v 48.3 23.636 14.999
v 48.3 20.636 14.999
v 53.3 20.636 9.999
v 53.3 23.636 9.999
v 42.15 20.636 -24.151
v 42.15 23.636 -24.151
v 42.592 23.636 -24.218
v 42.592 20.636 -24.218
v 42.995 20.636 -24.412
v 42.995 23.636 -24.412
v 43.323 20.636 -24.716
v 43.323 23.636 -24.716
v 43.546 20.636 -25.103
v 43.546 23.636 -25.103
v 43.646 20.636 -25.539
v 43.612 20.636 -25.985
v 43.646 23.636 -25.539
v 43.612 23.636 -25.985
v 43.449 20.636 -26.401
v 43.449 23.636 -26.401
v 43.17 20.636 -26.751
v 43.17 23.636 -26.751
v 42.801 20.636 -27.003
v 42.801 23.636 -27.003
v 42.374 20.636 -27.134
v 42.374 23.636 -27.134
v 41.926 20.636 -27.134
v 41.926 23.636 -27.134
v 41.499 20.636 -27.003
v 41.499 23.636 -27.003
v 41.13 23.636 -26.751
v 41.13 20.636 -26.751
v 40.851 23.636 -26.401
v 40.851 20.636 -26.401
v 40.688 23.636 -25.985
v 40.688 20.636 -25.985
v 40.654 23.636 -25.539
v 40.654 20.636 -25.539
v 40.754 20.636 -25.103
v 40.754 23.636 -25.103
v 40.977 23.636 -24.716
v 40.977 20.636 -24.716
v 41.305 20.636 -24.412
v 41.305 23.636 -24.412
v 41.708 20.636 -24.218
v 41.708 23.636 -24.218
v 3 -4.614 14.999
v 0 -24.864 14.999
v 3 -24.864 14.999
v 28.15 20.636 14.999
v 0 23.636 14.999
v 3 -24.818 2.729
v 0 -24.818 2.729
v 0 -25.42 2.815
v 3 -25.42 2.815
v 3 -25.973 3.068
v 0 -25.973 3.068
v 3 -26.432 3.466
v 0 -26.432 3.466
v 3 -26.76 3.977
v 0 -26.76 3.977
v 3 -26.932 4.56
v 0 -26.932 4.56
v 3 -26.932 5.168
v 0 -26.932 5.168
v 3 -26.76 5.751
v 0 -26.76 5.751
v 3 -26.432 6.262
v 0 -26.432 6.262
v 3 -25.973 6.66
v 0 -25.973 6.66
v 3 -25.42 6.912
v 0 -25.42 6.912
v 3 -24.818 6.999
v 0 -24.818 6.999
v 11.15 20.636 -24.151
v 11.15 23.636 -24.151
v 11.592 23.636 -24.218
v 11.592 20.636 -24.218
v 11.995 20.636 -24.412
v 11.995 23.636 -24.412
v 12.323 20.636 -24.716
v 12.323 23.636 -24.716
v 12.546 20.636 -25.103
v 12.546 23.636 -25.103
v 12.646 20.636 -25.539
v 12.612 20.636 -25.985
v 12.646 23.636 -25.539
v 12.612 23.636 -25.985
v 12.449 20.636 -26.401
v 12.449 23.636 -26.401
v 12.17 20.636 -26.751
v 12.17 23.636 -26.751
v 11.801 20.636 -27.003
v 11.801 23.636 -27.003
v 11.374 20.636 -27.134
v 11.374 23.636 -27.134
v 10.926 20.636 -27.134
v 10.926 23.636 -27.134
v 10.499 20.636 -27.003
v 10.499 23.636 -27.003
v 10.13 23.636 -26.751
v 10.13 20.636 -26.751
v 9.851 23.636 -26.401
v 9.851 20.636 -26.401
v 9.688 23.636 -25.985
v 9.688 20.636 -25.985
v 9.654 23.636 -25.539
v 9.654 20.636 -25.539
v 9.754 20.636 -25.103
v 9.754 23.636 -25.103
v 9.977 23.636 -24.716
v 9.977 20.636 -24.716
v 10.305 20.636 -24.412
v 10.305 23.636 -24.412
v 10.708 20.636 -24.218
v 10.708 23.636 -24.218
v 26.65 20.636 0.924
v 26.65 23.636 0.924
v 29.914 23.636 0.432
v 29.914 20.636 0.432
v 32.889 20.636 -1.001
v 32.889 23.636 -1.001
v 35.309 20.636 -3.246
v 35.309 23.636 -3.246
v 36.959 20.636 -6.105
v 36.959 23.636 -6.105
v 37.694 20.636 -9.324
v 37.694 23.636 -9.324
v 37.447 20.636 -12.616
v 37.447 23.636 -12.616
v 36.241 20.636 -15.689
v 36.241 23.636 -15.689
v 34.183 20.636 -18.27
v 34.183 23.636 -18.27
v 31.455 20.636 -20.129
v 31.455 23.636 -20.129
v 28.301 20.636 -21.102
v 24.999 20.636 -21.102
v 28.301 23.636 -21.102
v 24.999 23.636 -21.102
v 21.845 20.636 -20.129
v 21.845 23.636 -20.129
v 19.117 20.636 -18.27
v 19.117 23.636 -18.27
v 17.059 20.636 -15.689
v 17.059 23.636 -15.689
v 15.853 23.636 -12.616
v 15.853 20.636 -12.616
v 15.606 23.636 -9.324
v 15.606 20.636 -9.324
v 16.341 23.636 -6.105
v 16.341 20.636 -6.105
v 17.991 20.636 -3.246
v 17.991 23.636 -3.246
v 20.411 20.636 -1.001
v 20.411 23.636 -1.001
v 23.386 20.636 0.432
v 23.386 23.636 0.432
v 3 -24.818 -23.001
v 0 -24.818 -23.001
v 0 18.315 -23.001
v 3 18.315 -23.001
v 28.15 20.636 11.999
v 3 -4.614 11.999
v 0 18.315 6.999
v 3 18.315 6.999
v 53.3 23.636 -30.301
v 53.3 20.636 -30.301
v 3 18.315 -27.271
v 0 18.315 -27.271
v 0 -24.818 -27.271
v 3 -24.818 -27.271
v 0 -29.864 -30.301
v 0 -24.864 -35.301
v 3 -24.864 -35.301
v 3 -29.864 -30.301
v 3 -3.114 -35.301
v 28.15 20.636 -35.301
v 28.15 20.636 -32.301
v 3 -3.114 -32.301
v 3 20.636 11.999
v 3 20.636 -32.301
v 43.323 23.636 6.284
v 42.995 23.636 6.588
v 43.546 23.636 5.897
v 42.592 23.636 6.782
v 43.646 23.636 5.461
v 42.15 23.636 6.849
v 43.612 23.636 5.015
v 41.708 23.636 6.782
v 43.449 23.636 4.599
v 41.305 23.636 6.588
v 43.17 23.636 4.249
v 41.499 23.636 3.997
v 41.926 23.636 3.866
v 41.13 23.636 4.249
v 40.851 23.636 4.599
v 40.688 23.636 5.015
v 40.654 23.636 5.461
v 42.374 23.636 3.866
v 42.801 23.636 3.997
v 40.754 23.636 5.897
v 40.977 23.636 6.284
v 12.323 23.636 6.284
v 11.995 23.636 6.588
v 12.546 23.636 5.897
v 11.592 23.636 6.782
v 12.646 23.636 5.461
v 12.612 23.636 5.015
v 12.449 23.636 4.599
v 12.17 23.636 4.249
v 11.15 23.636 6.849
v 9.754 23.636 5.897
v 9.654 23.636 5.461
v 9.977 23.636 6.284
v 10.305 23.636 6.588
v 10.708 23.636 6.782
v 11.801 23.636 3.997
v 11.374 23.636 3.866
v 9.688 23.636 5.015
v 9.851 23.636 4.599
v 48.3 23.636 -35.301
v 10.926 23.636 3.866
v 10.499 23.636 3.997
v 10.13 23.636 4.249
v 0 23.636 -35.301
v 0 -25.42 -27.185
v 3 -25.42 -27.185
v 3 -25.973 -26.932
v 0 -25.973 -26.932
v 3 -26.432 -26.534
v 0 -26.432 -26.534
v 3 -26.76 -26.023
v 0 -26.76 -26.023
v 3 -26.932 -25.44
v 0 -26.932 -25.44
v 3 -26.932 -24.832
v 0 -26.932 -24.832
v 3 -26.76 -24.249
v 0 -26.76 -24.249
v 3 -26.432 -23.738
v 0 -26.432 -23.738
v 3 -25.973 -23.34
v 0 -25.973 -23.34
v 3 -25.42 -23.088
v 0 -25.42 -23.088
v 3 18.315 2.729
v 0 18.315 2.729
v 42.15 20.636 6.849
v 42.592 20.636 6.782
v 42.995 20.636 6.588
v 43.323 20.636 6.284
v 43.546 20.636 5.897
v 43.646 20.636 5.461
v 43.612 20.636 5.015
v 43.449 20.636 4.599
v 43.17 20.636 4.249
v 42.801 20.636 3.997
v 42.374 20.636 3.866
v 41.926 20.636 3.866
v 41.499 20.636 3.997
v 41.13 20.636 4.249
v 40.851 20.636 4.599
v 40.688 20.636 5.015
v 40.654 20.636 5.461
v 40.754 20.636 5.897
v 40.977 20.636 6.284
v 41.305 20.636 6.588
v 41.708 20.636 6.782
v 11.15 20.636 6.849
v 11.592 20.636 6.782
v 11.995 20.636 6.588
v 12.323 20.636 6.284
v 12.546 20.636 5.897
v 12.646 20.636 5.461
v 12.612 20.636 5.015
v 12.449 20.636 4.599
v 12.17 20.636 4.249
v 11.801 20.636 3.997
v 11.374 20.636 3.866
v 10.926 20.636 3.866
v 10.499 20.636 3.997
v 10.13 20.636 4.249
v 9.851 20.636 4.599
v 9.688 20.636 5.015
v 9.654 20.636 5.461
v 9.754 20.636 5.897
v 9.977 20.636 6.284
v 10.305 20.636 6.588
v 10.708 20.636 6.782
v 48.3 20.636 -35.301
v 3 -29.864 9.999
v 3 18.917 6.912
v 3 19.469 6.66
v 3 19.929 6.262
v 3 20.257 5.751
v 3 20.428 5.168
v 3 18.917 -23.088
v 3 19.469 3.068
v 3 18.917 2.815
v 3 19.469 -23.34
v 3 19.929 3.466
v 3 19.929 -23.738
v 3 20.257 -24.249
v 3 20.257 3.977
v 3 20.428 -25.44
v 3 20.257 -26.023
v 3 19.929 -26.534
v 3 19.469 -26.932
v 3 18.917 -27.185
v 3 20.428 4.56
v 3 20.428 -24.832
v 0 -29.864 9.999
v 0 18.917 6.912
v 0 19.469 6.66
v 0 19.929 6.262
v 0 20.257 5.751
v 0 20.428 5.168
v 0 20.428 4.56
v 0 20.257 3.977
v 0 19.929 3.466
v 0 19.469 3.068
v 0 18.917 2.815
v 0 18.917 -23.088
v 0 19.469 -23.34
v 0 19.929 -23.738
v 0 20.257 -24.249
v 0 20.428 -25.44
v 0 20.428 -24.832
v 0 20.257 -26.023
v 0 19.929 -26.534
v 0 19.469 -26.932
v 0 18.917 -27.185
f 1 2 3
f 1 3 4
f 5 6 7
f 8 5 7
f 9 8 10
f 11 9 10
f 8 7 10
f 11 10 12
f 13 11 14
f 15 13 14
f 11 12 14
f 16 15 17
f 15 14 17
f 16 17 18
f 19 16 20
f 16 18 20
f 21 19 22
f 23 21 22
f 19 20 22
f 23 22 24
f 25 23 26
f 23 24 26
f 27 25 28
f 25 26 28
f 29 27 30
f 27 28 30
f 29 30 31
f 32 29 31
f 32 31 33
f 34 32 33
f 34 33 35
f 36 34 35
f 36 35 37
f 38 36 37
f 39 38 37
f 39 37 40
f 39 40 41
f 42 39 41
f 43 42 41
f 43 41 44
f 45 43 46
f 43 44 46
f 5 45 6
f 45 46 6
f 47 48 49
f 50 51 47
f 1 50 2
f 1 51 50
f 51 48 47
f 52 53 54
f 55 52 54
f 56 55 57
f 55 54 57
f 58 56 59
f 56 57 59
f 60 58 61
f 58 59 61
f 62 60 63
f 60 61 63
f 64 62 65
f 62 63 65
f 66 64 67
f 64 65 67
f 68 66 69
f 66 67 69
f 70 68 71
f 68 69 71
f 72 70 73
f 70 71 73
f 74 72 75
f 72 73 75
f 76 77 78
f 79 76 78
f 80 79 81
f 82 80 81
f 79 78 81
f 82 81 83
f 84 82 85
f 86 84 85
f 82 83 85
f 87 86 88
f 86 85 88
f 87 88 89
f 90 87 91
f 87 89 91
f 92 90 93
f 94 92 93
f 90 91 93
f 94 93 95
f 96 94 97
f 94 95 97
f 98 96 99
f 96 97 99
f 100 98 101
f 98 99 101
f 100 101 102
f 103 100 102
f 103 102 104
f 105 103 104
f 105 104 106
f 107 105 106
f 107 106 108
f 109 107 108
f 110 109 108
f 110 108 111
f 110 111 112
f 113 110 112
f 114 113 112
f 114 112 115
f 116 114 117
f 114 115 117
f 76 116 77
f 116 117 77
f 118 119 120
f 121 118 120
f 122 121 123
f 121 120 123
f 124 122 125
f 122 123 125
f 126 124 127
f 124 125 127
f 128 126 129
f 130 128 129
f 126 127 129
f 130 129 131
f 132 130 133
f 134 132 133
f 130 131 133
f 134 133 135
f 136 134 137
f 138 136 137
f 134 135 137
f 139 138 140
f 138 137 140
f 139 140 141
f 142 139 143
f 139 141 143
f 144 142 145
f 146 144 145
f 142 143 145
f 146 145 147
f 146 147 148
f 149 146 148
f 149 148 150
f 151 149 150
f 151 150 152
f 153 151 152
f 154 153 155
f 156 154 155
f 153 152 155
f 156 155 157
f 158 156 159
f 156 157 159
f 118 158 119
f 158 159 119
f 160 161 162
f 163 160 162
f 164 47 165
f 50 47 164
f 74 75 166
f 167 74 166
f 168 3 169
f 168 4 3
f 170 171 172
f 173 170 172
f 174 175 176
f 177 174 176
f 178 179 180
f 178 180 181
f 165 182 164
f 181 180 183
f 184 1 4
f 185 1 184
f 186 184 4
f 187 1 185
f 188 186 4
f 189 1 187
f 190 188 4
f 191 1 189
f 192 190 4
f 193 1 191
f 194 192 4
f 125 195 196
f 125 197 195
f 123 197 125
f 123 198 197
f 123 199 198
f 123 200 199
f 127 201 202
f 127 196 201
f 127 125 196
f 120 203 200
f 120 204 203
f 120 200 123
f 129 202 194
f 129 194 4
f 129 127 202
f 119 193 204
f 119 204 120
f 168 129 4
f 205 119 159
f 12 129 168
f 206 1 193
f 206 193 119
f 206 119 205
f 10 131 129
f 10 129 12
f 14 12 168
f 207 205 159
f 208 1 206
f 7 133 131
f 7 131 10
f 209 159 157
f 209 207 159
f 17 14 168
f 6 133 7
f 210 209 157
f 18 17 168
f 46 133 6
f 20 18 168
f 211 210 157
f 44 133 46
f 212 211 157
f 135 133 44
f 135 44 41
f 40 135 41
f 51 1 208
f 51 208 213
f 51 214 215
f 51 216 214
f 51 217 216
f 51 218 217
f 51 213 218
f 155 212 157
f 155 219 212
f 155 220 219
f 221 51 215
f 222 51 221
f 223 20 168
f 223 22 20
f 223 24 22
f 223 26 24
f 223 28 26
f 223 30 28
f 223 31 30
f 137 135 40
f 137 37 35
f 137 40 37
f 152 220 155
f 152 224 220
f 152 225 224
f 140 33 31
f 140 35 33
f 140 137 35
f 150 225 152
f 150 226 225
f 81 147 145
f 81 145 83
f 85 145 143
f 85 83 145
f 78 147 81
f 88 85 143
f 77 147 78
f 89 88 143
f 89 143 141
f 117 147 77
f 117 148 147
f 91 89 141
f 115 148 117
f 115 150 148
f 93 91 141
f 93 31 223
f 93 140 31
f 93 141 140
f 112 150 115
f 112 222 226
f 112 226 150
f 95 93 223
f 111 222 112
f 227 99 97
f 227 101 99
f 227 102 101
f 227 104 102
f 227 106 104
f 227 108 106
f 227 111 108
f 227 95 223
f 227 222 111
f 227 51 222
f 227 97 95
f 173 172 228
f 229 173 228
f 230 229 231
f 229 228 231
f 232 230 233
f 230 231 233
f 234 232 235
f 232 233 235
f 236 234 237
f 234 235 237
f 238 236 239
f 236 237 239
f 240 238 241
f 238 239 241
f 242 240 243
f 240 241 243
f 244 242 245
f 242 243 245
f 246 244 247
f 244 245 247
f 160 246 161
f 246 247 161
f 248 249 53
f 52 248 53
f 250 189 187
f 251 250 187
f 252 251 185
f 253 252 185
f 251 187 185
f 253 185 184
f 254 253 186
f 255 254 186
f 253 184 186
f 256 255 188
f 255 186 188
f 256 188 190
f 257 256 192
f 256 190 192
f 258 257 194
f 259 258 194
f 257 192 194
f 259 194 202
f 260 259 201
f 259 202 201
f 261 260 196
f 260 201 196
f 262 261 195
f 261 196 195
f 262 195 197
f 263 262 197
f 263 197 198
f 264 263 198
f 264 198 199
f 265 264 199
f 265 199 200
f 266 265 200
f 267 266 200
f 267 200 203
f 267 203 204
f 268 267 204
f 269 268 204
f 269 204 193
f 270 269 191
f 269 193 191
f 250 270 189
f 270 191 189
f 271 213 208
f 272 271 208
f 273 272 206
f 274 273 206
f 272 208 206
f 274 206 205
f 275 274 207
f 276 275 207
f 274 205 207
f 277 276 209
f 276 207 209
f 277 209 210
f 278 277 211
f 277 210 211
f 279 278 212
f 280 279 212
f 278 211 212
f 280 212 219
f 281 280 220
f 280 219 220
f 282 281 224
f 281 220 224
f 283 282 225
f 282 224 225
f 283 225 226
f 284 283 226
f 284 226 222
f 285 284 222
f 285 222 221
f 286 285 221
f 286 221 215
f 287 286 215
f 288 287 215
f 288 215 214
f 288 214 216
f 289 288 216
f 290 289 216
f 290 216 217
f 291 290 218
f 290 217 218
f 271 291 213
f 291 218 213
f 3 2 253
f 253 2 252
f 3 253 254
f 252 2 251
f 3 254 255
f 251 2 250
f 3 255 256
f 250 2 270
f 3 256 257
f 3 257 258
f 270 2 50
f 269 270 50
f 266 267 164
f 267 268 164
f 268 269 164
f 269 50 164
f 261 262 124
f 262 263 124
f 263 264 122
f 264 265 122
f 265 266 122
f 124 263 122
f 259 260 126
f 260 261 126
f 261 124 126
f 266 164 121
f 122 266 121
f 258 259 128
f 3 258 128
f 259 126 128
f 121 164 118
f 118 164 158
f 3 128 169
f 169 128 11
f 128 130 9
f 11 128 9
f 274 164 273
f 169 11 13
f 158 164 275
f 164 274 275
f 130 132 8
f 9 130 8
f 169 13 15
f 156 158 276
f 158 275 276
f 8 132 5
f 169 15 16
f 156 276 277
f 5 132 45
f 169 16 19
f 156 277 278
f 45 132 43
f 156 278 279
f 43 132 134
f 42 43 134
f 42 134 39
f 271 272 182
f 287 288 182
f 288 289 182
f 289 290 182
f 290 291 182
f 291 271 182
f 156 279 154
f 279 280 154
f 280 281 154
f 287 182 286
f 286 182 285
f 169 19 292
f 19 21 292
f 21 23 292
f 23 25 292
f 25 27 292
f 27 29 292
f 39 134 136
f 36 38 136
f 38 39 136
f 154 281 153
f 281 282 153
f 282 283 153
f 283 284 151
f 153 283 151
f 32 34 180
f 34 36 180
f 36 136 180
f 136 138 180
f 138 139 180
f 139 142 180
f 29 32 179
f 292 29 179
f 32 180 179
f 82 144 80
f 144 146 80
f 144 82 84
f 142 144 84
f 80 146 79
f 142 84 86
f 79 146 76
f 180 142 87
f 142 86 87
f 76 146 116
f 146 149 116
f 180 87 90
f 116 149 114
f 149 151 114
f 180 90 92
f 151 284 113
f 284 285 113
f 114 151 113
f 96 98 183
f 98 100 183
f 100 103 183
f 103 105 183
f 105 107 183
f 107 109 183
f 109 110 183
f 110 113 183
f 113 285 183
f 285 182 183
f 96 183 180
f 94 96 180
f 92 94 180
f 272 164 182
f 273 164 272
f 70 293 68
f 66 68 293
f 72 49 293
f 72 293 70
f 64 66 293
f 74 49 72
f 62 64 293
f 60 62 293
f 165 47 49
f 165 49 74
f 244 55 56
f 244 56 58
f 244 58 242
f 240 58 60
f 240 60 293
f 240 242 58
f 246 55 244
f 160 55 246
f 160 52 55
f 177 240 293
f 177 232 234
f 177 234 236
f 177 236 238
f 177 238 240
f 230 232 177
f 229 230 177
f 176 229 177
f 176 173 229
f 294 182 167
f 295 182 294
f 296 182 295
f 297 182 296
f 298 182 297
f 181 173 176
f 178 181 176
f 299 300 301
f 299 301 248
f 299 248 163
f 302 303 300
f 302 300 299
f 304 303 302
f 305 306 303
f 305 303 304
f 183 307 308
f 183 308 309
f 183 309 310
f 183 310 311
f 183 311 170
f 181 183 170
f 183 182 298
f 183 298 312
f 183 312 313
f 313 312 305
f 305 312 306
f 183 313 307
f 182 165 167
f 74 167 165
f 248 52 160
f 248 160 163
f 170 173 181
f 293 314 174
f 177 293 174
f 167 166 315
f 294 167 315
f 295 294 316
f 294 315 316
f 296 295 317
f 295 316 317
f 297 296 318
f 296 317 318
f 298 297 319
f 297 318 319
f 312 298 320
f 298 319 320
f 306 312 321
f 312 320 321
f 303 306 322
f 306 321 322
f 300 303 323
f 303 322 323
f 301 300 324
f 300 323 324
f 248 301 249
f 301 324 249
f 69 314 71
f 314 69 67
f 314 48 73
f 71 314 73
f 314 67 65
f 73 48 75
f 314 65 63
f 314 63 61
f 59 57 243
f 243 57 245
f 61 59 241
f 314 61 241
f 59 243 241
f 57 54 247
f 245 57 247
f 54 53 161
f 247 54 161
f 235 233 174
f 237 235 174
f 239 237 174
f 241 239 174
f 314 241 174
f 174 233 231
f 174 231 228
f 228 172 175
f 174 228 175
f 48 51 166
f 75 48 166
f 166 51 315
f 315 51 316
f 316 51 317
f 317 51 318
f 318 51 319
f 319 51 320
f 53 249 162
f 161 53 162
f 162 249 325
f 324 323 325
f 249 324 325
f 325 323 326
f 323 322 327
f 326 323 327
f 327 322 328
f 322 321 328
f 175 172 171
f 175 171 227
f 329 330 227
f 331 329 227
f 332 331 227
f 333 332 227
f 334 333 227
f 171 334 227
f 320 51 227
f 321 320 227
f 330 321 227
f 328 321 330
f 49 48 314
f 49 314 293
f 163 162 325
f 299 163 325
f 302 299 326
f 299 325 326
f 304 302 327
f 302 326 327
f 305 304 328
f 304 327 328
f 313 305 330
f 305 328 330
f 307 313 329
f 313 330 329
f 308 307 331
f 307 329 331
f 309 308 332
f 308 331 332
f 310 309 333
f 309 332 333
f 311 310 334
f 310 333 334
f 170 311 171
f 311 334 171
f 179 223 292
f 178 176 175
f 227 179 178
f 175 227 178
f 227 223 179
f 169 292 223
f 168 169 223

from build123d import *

# Parameters (mm, degrees)
SKETCH1_W           = 50.3
SKETCH1_H           = 53.5
BOSS_EXTRUDE1_DEPTH = 3
SKETCH3_W           = 50.3
SKETCH3_H           = 3
BOSS_EXTRUDE3_DEPTH = 50.3
BOSS_EXTRUDE6_DEPTH = 3
BOSS_EXTRUDE7_DEPTH = 3
SKETCH12_R          = 1.5
SKETCH12_R_2        = 11.075
CUT_EXTRUDE1_DEPTH  = 3
CHAMFER2_SIZE       = 5
CHAMFER3_SIZE       = 5
CHAMFER4_SIZE       = 5
CHAMFER5_SIZE       = 5


with BuildPart() as part:
    # Sketch1 → Boss-Extrude1 (new body)
    with BuildSketch(Plane(origin=(0, 0, 0), x_dir=(0, 0, -1), z_dir=(1, 0, 0))):
        with Locations((10.151141702, -3.113798218)):
            Rectangle(SKETCH1_W, SKETCH1_H)
        with BuildLine():
            Line((-6.998858298, -24.818417552), (-6.998858298, 18.3151534))
            ThreePointArc((-6.998858298, 18.3151534), (-4.863858298, 20.4501534), (-2.728858298, 18.3151534))
            Line((-2.728858298, 18.3151534), (-2.728858298, -24.818417552))
            ThreePointArc((-2.728858298, -24.818417552), (-4.863858298, -26.953417552), (-6.998858298, -24.818417552))
        make_face(mode=Mode.SUBTRACT)
        with BuildLine():
            Line((27.271141702, 18.3151534), (27.271141702, -24.818417552))
            ThreePointArc((27.271141702, -24.818417552), (25.136141702, -26.953417552), (23.001141702, -24.818417552))
            Line((23.001141702, -24.818417552), (23.001141702, 18.3151534))
            ThreePointArc((23.001141702, 18.3151534), (25.136141702, 20.4501534), (27.271141702, 18.3151534))
        make_face(mode=Mode.SUBTRACT)
    extrude(amount=BOSS_EXTRUDE1_DEPTH)

    # Sketch3 → Boss-Extrude3 (add)
    with BuildSketch(Plane(origin=(3, 0, 0), x_dir=(0, 0, -1), z_dir=(1, 0, 0))):
        with Locations((10.151141702, 22.136201782)):
            Rectangle(SKETCH3_W, SKETCH3_H)
    extrude(amount=BOSS_EXTRUDE3_DEPTH)

    # Sketch11 → Boss-Extrude6 (add)
    with BuildSketch(Plane.XY.offset(14.998858298)):
        Polygon((3, 20.636201782), (3, -4.613798218), (28.15, 20.636201782), align=None)
    extrude(amount=-BOSS_EXTRUDE6_DEPTH)

    # Sketch7 → Boss-Extrude7 (add)
    with BuildSketch(Plane(origin=(0, 0, -35.301141702), x_dir=(-1, 0, 0), z_dir=(0, 0, -1))):
        Polygon((-3, 20.636201782), (-28.15, 20.636201782), (-3, -3.113798218), align=None)
    extrude(amount=-BOSS_EXTRUDE7_DEPTH)

    # Sketch12 → Cut-Extrude1 (cut)
    with BuildSketch(Plane(origin=(0, 23.636201782, 0), x_dir=(1, 0, 0), z_dir=(0, 1, 0))):
        with Locations(Location((42.15, 25.651141702, 0), (0, 0, 270))):
            Circle(SKETCH12_R)
        with Locations(Location((42.15, -5.348858298, 0), (0, 0, 270))):
            Circle(SKETCH12_R)
        with Locations(Location((11.15, 25.651141702, 0), (0, 0, 270))):
            Circle(SKETCH12_R)
        with Locations(Location((11.15, -5.348858298, 0), (0, 0, 270))):
            Circle(SKETCH12_R)
        with Locations(Location((26.65, 10.151141702, 0), (0, 0, 270))):
            Circle(SKETCH12_R_2)
    extrude(amount=-CUT_EXTRUDE1_DEPTH, mode=Mode.SUBTRACT)

    # Chamfer2
    chamfer2_edges = [part.edges().sort_by_distance(p)[0] for p in [
        (53.3, 22.136201782, -35.301141702),
    ]]
    chamfer(chamfer2_edges, length=CHAMFER2_SIZE)

    # Chamfer3
    chamfer3_edges = [part.edges().sort_by_distance(p)[0] for p in [
        (53.3, 22.136201782, 14.998858298),
    ]]
    chamfer(chamfer3_edges, length=CHAMFER3_SIZE)

    # Chamfer4
    chamfer4_edges = [part.edges().sort_by_distance(p)[0] for p in [
        (1.5, -29.863798218, 14.998858298),
    ]]
    chamfer(chamfer4_edges, length=CHAMFER4_SIZE)

    # Chamfer5
    chamfer5_edges = [part.edges().sort_by_distance(p)[0] for p in [
        (1.5, -29.863798218, -35.301141702),
    ]]
    chamfer(chamfer5_edges, length=CHAMFER5_SIZE)


solid = part.part
